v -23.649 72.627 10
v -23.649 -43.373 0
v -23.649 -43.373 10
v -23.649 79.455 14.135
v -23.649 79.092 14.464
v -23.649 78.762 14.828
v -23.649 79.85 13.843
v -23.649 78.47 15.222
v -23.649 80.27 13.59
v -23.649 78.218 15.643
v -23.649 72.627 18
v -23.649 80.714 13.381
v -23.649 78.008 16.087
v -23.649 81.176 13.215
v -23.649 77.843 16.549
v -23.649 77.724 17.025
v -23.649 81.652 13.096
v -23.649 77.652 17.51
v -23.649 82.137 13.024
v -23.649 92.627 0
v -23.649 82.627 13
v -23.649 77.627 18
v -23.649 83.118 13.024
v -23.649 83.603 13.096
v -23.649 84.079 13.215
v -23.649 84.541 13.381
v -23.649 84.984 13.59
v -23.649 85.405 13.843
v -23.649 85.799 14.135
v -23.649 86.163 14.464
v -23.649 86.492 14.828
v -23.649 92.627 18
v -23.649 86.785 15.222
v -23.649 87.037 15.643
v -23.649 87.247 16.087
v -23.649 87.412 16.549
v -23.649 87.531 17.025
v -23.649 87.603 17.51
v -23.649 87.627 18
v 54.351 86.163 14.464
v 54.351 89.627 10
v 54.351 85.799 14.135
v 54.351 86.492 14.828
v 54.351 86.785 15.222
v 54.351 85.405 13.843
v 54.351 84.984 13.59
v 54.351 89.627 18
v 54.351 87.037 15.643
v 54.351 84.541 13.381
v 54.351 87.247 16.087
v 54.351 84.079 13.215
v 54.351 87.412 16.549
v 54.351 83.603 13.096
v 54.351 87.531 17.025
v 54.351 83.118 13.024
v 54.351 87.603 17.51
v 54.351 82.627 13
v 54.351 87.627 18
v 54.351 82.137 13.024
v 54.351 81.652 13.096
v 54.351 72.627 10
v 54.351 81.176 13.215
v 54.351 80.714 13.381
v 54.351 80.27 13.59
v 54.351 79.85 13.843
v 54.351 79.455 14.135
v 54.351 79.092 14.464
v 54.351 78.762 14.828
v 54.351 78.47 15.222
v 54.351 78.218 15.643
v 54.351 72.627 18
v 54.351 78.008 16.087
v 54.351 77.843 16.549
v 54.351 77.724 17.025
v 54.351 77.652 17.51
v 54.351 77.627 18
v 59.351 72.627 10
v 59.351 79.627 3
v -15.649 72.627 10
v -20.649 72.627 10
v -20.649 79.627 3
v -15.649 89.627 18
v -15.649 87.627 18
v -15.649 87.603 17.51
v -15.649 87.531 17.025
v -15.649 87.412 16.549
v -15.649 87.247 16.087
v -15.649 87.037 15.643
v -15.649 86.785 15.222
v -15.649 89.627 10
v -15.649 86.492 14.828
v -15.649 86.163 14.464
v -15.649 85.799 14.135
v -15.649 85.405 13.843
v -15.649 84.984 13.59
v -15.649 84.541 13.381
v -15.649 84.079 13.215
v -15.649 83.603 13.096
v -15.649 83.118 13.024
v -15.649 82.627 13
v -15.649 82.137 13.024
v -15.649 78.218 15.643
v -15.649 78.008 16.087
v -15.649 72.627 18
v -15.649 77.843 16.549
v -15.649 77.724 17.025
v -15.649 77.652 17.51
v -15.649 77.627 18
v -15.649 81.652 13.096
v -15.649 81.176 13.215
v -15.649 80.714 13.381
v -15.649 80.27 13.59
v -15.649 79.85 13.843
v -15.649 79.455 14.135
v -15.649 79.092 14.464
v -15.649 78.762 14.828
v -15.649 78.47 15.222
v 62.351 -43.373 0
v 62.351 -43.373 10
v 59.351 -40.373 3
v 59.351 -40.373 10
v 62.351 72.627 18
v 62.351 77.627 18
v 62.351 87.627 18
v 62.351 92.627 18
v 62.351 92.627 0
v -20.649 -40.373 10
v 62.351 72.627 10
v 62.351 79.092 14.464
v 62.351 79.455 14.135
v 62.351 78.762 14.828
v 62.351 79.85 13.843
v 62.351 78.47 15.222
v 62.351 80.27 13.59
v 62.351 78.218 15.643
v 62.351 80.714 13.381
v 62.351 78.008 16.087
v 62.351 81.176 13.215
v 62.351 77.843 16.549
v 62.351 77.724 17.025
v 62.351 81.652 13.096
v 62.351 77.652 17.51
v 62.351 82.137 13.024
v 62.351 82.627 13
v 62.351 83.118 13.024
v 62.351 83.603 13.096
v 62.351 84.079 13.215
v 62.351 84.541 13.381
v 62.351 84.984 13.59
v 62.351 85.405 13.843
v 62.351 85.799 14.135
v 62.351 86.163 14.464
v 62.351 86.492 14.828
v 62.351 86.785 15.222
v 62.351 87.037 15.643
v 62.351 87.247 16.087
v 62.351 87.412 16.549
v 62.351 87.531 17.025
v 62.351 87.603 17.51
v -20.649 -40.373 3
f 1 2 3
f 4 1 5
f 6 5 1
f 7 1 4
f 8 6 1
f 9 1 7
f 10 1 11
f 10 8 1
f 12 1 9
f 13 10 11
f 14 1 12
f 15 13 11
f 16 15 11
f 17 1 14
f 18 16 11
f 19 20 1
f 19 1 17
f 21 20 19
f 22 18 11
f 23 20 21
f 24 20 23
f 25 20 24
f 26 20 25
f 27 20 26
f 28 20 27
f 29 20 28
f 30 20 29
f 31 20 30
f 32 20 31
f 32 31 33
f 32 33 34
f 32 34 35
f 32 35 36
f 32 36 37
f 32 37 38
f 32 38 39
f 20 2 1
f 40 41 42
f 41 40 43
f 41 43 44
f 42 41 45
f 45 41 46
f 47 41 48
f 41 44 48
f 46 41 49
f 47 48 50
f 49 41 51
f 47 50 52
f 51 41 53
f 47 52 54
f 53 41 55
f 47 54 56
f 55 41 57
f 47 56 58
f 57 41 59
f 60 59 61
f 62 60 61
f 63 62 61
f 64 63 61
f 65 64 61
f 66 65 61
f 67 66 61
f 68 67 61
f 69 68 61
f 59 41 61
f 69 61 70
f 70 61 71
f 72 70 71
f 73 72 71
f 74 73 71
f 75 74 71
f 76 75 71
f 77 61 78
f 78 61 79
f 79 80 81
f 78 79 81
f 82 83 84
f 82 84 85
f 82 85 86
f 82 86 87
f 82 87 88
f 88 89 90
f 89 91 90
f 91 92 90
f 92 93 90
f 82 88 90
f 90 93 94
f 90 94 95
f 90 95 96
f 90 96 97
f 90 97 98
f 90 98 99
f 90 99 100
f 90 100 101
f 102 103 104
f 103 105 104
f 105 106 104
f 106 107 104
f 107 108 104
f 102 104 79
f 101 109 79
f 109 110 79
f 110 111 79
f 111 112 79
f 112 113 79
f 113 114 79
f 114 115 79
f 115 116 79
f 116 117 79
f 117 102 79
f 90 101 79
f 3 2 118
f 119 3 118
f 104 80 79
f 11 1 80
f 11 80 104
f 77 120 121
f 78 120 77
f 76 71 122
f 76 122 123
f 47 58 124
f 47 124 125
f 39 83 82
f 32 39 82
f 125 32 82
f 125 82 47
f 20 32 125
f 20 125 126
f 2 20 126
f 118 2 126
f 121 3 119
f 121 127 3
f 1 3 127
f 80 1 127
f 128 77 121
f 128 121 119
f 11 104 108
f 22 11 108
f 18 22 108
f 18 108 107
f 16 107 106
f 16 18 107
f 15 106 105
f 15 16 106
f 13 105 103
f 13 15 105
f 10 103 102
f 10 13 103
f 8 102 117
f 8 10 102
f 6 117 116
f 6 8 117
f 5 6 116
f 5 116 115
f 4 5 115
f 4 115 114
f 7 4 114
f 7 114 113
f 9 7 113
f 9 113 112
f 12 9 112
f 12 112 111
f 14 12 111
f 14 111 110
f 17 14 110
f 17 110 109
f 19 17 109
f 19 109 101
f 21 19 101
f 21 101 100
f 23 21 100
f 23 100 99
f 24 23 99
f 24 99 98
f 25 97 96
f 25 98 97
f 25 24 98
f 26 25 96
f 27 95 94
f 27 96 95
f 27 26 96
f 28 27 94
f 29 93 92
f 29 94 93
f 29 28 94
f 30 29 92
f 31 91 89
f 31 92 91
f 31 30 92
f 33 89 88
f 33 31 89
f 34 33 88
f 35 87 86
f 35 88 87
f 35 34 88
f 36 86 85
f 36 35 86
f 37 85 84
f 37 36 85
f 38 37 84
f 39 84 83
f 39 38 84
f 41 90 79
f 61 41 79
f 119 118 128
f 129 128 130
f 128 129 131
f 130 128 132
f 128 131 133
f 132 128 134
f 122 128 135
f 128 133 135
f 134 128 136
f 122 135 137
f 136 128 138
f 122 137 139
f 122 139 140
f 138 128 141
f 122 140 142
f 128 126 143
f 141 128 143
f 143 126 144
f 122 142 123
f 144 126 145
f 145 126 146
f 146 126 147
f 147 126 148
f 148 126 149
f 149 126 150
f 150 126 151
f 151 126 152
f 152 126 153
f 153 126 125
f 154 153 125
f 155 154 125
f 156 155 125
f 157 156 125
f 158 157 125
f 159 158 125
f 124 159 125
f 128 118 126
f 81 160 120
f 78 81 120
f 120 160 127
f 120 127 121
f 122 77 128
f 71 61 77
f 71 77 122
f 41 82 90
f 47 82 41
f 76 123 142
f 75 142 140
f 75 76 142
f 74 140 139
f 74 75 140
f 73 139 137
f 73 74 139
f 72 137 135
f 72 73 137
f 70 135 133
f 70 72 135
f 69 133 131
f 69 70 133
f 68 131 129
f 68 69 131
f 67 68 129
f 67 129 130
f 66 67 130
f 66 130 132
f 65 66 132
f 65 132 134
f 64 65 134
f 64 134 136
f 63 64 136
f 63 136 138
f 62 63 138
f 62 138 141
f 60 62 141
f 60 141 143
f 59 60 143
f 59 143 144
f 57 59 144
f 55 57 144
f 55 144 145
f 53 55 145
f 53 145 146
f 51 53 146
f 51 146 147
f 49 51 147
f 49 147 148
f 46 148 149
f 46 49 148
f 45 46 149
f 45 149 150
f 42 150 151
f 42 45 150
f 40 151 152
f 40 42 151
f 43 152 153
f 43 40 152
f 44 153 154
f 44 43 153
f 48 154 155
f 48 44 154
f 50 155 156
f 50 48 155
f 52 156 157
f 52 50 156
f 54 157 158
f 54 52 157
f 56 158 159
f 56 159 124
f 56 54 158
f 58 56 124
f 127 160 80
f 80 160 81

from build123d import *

# Parameters (mm, degrees)
IZIM1_W                     = 86
IZIM1_H                     = 136
IZIM1_W_2                   = 80
IZIM1_H_2                   = 130
Y_KSEKLIK_EKSTR_ZYON1_DEPTH = 10
IZIM1_2_W                   = 80
IZIM1_2_H                   = 130
Y_KSEKLIK_EKSTR_ZYON2_DEPTH = 3
Y_KSEKLIK_EKSTR_ZYON3_DEPTH = 86
KES_EKSTR_ZYON2_DEPTH       = 17
Y_KSEKLIK_EKSTR_ZYON4_REACH = 127.67


with BuildPart() as part:
    # Çizim1 → Yükseklik-Ekstrüzyon1 (new body)
    with BuildSketch(Plane.XY):
        with Locations((19.351242886, 24.627445339)):
            Rectangle(IZIM1_W, IZIM1_H)
        with Locations((19.351242886, 24.627445339)):
            Rectangle(IZIM1_W_2, IZIM1_H_2, mode=Mode.SUBTRACT)
    extrude(amount=Y_KSEKLIK_EKSTR_ZYON1_DEPTH)

    # Çizim1<2> → Yükseklik-Ekstrüzyon2 (add)
    with BuildSketch(Plane.XY):
        with Locations((19.351242886, 24.627445339)):
            Rectangle(IZIM1_2_W, IZIM1_2_H)
    extrude(amount=Y_KSEKLIK_EKSTR_ZYON2_DEPTH)

    # Çizim2 → Yükseklik-Ekstrüzyon3 (add, through all)
    with BuildSketch(Plane.ZY.offset(23.648757114)):
        with BuildLine():
            Line((18, 92.627445339), (10, 92.627445339))
            Line((10, 92.627445339), (10, 87.627445339))
            Line((10, 87.627445339), (10, 77.627445339))
            Line((10, 77.627445339), (10, 72.627445339))
            Line((10, 72.627445339), (18, 72.627445339))
            Line((18, 72.627445339), (18, 75.627445339))
            Line((18, 75.627445339), (18, 77.627445339))
            ThreePointArc((18, 77.627445339), (13, 82.627445339), (18, 87.627445339))
            Line((18, 87.627445339), (18, 89.627445339))
            Line((18, 89.627445339), (18, 92.627445339))
        make_face()
    extrude(amount=-Y_KSEKLIK_EKSTR_ZYON3_DEPTH)

    # Çizim5 → Kes-Ekstrüzyon2 (cut)
    with BuildSketch(Plane.XZ.offset(-72.627445339)):
        Polygon((-15.648757114, 10), (-15.648757114, 3), (54.351242886, 3), (54.351242886, 10), (54.351242886, 18), (-15.648757114, 18), align=None)
    extrude(amount=-KES_EKSTR_ZYON2_DEPTH, mode=Mode.SUBTRACT)

    # Yükseklik-Ekstrüzyon4: up to this face of the body (flat: up to its plane)
    y_kseklik_ekstr_zyon4_end = Plane(part.part.faces().sort_by_distance((59.351242886, 24.627445339, 6.5))[0])
    # Çizim6 → Yükseklik-Ekstrüzyon4 (add, up to the picked face)
    with BuildSketch(Plane(origin=(-20.648757114, 0, 0), x_dir=(0, 0, -1), z_dir=(1, 0, 0)), mode=Mode.PRIVATE) as y_kseklik_ekstr_zyon4_sk1:
        Polygon((-10, 72.627445339), (0, 82.627445339), (0, 92.627445339), (-10, 92.627445339), align=None)
    y_kseklik_ekstr_zyon4_tool1 = split(extrude(y_kseklik_ekstr_zyon4_sk1.sketch, amount=Y_KSEKLIK_EKSTR_ZYON4_REACH, mode=Mode.PRIVATE), bisect_by=y_kseklik_ekstr_zyon4_end, keep=Keep.BOTH, mode=Mode.PRIVATE)
    add(y_kseklik_ekstr_zyon4_tool1.solids().sort_by(Axis((-20.648757, 84.849668, 5.555556), (1, 0, 0)))[0])


solid = part.part
